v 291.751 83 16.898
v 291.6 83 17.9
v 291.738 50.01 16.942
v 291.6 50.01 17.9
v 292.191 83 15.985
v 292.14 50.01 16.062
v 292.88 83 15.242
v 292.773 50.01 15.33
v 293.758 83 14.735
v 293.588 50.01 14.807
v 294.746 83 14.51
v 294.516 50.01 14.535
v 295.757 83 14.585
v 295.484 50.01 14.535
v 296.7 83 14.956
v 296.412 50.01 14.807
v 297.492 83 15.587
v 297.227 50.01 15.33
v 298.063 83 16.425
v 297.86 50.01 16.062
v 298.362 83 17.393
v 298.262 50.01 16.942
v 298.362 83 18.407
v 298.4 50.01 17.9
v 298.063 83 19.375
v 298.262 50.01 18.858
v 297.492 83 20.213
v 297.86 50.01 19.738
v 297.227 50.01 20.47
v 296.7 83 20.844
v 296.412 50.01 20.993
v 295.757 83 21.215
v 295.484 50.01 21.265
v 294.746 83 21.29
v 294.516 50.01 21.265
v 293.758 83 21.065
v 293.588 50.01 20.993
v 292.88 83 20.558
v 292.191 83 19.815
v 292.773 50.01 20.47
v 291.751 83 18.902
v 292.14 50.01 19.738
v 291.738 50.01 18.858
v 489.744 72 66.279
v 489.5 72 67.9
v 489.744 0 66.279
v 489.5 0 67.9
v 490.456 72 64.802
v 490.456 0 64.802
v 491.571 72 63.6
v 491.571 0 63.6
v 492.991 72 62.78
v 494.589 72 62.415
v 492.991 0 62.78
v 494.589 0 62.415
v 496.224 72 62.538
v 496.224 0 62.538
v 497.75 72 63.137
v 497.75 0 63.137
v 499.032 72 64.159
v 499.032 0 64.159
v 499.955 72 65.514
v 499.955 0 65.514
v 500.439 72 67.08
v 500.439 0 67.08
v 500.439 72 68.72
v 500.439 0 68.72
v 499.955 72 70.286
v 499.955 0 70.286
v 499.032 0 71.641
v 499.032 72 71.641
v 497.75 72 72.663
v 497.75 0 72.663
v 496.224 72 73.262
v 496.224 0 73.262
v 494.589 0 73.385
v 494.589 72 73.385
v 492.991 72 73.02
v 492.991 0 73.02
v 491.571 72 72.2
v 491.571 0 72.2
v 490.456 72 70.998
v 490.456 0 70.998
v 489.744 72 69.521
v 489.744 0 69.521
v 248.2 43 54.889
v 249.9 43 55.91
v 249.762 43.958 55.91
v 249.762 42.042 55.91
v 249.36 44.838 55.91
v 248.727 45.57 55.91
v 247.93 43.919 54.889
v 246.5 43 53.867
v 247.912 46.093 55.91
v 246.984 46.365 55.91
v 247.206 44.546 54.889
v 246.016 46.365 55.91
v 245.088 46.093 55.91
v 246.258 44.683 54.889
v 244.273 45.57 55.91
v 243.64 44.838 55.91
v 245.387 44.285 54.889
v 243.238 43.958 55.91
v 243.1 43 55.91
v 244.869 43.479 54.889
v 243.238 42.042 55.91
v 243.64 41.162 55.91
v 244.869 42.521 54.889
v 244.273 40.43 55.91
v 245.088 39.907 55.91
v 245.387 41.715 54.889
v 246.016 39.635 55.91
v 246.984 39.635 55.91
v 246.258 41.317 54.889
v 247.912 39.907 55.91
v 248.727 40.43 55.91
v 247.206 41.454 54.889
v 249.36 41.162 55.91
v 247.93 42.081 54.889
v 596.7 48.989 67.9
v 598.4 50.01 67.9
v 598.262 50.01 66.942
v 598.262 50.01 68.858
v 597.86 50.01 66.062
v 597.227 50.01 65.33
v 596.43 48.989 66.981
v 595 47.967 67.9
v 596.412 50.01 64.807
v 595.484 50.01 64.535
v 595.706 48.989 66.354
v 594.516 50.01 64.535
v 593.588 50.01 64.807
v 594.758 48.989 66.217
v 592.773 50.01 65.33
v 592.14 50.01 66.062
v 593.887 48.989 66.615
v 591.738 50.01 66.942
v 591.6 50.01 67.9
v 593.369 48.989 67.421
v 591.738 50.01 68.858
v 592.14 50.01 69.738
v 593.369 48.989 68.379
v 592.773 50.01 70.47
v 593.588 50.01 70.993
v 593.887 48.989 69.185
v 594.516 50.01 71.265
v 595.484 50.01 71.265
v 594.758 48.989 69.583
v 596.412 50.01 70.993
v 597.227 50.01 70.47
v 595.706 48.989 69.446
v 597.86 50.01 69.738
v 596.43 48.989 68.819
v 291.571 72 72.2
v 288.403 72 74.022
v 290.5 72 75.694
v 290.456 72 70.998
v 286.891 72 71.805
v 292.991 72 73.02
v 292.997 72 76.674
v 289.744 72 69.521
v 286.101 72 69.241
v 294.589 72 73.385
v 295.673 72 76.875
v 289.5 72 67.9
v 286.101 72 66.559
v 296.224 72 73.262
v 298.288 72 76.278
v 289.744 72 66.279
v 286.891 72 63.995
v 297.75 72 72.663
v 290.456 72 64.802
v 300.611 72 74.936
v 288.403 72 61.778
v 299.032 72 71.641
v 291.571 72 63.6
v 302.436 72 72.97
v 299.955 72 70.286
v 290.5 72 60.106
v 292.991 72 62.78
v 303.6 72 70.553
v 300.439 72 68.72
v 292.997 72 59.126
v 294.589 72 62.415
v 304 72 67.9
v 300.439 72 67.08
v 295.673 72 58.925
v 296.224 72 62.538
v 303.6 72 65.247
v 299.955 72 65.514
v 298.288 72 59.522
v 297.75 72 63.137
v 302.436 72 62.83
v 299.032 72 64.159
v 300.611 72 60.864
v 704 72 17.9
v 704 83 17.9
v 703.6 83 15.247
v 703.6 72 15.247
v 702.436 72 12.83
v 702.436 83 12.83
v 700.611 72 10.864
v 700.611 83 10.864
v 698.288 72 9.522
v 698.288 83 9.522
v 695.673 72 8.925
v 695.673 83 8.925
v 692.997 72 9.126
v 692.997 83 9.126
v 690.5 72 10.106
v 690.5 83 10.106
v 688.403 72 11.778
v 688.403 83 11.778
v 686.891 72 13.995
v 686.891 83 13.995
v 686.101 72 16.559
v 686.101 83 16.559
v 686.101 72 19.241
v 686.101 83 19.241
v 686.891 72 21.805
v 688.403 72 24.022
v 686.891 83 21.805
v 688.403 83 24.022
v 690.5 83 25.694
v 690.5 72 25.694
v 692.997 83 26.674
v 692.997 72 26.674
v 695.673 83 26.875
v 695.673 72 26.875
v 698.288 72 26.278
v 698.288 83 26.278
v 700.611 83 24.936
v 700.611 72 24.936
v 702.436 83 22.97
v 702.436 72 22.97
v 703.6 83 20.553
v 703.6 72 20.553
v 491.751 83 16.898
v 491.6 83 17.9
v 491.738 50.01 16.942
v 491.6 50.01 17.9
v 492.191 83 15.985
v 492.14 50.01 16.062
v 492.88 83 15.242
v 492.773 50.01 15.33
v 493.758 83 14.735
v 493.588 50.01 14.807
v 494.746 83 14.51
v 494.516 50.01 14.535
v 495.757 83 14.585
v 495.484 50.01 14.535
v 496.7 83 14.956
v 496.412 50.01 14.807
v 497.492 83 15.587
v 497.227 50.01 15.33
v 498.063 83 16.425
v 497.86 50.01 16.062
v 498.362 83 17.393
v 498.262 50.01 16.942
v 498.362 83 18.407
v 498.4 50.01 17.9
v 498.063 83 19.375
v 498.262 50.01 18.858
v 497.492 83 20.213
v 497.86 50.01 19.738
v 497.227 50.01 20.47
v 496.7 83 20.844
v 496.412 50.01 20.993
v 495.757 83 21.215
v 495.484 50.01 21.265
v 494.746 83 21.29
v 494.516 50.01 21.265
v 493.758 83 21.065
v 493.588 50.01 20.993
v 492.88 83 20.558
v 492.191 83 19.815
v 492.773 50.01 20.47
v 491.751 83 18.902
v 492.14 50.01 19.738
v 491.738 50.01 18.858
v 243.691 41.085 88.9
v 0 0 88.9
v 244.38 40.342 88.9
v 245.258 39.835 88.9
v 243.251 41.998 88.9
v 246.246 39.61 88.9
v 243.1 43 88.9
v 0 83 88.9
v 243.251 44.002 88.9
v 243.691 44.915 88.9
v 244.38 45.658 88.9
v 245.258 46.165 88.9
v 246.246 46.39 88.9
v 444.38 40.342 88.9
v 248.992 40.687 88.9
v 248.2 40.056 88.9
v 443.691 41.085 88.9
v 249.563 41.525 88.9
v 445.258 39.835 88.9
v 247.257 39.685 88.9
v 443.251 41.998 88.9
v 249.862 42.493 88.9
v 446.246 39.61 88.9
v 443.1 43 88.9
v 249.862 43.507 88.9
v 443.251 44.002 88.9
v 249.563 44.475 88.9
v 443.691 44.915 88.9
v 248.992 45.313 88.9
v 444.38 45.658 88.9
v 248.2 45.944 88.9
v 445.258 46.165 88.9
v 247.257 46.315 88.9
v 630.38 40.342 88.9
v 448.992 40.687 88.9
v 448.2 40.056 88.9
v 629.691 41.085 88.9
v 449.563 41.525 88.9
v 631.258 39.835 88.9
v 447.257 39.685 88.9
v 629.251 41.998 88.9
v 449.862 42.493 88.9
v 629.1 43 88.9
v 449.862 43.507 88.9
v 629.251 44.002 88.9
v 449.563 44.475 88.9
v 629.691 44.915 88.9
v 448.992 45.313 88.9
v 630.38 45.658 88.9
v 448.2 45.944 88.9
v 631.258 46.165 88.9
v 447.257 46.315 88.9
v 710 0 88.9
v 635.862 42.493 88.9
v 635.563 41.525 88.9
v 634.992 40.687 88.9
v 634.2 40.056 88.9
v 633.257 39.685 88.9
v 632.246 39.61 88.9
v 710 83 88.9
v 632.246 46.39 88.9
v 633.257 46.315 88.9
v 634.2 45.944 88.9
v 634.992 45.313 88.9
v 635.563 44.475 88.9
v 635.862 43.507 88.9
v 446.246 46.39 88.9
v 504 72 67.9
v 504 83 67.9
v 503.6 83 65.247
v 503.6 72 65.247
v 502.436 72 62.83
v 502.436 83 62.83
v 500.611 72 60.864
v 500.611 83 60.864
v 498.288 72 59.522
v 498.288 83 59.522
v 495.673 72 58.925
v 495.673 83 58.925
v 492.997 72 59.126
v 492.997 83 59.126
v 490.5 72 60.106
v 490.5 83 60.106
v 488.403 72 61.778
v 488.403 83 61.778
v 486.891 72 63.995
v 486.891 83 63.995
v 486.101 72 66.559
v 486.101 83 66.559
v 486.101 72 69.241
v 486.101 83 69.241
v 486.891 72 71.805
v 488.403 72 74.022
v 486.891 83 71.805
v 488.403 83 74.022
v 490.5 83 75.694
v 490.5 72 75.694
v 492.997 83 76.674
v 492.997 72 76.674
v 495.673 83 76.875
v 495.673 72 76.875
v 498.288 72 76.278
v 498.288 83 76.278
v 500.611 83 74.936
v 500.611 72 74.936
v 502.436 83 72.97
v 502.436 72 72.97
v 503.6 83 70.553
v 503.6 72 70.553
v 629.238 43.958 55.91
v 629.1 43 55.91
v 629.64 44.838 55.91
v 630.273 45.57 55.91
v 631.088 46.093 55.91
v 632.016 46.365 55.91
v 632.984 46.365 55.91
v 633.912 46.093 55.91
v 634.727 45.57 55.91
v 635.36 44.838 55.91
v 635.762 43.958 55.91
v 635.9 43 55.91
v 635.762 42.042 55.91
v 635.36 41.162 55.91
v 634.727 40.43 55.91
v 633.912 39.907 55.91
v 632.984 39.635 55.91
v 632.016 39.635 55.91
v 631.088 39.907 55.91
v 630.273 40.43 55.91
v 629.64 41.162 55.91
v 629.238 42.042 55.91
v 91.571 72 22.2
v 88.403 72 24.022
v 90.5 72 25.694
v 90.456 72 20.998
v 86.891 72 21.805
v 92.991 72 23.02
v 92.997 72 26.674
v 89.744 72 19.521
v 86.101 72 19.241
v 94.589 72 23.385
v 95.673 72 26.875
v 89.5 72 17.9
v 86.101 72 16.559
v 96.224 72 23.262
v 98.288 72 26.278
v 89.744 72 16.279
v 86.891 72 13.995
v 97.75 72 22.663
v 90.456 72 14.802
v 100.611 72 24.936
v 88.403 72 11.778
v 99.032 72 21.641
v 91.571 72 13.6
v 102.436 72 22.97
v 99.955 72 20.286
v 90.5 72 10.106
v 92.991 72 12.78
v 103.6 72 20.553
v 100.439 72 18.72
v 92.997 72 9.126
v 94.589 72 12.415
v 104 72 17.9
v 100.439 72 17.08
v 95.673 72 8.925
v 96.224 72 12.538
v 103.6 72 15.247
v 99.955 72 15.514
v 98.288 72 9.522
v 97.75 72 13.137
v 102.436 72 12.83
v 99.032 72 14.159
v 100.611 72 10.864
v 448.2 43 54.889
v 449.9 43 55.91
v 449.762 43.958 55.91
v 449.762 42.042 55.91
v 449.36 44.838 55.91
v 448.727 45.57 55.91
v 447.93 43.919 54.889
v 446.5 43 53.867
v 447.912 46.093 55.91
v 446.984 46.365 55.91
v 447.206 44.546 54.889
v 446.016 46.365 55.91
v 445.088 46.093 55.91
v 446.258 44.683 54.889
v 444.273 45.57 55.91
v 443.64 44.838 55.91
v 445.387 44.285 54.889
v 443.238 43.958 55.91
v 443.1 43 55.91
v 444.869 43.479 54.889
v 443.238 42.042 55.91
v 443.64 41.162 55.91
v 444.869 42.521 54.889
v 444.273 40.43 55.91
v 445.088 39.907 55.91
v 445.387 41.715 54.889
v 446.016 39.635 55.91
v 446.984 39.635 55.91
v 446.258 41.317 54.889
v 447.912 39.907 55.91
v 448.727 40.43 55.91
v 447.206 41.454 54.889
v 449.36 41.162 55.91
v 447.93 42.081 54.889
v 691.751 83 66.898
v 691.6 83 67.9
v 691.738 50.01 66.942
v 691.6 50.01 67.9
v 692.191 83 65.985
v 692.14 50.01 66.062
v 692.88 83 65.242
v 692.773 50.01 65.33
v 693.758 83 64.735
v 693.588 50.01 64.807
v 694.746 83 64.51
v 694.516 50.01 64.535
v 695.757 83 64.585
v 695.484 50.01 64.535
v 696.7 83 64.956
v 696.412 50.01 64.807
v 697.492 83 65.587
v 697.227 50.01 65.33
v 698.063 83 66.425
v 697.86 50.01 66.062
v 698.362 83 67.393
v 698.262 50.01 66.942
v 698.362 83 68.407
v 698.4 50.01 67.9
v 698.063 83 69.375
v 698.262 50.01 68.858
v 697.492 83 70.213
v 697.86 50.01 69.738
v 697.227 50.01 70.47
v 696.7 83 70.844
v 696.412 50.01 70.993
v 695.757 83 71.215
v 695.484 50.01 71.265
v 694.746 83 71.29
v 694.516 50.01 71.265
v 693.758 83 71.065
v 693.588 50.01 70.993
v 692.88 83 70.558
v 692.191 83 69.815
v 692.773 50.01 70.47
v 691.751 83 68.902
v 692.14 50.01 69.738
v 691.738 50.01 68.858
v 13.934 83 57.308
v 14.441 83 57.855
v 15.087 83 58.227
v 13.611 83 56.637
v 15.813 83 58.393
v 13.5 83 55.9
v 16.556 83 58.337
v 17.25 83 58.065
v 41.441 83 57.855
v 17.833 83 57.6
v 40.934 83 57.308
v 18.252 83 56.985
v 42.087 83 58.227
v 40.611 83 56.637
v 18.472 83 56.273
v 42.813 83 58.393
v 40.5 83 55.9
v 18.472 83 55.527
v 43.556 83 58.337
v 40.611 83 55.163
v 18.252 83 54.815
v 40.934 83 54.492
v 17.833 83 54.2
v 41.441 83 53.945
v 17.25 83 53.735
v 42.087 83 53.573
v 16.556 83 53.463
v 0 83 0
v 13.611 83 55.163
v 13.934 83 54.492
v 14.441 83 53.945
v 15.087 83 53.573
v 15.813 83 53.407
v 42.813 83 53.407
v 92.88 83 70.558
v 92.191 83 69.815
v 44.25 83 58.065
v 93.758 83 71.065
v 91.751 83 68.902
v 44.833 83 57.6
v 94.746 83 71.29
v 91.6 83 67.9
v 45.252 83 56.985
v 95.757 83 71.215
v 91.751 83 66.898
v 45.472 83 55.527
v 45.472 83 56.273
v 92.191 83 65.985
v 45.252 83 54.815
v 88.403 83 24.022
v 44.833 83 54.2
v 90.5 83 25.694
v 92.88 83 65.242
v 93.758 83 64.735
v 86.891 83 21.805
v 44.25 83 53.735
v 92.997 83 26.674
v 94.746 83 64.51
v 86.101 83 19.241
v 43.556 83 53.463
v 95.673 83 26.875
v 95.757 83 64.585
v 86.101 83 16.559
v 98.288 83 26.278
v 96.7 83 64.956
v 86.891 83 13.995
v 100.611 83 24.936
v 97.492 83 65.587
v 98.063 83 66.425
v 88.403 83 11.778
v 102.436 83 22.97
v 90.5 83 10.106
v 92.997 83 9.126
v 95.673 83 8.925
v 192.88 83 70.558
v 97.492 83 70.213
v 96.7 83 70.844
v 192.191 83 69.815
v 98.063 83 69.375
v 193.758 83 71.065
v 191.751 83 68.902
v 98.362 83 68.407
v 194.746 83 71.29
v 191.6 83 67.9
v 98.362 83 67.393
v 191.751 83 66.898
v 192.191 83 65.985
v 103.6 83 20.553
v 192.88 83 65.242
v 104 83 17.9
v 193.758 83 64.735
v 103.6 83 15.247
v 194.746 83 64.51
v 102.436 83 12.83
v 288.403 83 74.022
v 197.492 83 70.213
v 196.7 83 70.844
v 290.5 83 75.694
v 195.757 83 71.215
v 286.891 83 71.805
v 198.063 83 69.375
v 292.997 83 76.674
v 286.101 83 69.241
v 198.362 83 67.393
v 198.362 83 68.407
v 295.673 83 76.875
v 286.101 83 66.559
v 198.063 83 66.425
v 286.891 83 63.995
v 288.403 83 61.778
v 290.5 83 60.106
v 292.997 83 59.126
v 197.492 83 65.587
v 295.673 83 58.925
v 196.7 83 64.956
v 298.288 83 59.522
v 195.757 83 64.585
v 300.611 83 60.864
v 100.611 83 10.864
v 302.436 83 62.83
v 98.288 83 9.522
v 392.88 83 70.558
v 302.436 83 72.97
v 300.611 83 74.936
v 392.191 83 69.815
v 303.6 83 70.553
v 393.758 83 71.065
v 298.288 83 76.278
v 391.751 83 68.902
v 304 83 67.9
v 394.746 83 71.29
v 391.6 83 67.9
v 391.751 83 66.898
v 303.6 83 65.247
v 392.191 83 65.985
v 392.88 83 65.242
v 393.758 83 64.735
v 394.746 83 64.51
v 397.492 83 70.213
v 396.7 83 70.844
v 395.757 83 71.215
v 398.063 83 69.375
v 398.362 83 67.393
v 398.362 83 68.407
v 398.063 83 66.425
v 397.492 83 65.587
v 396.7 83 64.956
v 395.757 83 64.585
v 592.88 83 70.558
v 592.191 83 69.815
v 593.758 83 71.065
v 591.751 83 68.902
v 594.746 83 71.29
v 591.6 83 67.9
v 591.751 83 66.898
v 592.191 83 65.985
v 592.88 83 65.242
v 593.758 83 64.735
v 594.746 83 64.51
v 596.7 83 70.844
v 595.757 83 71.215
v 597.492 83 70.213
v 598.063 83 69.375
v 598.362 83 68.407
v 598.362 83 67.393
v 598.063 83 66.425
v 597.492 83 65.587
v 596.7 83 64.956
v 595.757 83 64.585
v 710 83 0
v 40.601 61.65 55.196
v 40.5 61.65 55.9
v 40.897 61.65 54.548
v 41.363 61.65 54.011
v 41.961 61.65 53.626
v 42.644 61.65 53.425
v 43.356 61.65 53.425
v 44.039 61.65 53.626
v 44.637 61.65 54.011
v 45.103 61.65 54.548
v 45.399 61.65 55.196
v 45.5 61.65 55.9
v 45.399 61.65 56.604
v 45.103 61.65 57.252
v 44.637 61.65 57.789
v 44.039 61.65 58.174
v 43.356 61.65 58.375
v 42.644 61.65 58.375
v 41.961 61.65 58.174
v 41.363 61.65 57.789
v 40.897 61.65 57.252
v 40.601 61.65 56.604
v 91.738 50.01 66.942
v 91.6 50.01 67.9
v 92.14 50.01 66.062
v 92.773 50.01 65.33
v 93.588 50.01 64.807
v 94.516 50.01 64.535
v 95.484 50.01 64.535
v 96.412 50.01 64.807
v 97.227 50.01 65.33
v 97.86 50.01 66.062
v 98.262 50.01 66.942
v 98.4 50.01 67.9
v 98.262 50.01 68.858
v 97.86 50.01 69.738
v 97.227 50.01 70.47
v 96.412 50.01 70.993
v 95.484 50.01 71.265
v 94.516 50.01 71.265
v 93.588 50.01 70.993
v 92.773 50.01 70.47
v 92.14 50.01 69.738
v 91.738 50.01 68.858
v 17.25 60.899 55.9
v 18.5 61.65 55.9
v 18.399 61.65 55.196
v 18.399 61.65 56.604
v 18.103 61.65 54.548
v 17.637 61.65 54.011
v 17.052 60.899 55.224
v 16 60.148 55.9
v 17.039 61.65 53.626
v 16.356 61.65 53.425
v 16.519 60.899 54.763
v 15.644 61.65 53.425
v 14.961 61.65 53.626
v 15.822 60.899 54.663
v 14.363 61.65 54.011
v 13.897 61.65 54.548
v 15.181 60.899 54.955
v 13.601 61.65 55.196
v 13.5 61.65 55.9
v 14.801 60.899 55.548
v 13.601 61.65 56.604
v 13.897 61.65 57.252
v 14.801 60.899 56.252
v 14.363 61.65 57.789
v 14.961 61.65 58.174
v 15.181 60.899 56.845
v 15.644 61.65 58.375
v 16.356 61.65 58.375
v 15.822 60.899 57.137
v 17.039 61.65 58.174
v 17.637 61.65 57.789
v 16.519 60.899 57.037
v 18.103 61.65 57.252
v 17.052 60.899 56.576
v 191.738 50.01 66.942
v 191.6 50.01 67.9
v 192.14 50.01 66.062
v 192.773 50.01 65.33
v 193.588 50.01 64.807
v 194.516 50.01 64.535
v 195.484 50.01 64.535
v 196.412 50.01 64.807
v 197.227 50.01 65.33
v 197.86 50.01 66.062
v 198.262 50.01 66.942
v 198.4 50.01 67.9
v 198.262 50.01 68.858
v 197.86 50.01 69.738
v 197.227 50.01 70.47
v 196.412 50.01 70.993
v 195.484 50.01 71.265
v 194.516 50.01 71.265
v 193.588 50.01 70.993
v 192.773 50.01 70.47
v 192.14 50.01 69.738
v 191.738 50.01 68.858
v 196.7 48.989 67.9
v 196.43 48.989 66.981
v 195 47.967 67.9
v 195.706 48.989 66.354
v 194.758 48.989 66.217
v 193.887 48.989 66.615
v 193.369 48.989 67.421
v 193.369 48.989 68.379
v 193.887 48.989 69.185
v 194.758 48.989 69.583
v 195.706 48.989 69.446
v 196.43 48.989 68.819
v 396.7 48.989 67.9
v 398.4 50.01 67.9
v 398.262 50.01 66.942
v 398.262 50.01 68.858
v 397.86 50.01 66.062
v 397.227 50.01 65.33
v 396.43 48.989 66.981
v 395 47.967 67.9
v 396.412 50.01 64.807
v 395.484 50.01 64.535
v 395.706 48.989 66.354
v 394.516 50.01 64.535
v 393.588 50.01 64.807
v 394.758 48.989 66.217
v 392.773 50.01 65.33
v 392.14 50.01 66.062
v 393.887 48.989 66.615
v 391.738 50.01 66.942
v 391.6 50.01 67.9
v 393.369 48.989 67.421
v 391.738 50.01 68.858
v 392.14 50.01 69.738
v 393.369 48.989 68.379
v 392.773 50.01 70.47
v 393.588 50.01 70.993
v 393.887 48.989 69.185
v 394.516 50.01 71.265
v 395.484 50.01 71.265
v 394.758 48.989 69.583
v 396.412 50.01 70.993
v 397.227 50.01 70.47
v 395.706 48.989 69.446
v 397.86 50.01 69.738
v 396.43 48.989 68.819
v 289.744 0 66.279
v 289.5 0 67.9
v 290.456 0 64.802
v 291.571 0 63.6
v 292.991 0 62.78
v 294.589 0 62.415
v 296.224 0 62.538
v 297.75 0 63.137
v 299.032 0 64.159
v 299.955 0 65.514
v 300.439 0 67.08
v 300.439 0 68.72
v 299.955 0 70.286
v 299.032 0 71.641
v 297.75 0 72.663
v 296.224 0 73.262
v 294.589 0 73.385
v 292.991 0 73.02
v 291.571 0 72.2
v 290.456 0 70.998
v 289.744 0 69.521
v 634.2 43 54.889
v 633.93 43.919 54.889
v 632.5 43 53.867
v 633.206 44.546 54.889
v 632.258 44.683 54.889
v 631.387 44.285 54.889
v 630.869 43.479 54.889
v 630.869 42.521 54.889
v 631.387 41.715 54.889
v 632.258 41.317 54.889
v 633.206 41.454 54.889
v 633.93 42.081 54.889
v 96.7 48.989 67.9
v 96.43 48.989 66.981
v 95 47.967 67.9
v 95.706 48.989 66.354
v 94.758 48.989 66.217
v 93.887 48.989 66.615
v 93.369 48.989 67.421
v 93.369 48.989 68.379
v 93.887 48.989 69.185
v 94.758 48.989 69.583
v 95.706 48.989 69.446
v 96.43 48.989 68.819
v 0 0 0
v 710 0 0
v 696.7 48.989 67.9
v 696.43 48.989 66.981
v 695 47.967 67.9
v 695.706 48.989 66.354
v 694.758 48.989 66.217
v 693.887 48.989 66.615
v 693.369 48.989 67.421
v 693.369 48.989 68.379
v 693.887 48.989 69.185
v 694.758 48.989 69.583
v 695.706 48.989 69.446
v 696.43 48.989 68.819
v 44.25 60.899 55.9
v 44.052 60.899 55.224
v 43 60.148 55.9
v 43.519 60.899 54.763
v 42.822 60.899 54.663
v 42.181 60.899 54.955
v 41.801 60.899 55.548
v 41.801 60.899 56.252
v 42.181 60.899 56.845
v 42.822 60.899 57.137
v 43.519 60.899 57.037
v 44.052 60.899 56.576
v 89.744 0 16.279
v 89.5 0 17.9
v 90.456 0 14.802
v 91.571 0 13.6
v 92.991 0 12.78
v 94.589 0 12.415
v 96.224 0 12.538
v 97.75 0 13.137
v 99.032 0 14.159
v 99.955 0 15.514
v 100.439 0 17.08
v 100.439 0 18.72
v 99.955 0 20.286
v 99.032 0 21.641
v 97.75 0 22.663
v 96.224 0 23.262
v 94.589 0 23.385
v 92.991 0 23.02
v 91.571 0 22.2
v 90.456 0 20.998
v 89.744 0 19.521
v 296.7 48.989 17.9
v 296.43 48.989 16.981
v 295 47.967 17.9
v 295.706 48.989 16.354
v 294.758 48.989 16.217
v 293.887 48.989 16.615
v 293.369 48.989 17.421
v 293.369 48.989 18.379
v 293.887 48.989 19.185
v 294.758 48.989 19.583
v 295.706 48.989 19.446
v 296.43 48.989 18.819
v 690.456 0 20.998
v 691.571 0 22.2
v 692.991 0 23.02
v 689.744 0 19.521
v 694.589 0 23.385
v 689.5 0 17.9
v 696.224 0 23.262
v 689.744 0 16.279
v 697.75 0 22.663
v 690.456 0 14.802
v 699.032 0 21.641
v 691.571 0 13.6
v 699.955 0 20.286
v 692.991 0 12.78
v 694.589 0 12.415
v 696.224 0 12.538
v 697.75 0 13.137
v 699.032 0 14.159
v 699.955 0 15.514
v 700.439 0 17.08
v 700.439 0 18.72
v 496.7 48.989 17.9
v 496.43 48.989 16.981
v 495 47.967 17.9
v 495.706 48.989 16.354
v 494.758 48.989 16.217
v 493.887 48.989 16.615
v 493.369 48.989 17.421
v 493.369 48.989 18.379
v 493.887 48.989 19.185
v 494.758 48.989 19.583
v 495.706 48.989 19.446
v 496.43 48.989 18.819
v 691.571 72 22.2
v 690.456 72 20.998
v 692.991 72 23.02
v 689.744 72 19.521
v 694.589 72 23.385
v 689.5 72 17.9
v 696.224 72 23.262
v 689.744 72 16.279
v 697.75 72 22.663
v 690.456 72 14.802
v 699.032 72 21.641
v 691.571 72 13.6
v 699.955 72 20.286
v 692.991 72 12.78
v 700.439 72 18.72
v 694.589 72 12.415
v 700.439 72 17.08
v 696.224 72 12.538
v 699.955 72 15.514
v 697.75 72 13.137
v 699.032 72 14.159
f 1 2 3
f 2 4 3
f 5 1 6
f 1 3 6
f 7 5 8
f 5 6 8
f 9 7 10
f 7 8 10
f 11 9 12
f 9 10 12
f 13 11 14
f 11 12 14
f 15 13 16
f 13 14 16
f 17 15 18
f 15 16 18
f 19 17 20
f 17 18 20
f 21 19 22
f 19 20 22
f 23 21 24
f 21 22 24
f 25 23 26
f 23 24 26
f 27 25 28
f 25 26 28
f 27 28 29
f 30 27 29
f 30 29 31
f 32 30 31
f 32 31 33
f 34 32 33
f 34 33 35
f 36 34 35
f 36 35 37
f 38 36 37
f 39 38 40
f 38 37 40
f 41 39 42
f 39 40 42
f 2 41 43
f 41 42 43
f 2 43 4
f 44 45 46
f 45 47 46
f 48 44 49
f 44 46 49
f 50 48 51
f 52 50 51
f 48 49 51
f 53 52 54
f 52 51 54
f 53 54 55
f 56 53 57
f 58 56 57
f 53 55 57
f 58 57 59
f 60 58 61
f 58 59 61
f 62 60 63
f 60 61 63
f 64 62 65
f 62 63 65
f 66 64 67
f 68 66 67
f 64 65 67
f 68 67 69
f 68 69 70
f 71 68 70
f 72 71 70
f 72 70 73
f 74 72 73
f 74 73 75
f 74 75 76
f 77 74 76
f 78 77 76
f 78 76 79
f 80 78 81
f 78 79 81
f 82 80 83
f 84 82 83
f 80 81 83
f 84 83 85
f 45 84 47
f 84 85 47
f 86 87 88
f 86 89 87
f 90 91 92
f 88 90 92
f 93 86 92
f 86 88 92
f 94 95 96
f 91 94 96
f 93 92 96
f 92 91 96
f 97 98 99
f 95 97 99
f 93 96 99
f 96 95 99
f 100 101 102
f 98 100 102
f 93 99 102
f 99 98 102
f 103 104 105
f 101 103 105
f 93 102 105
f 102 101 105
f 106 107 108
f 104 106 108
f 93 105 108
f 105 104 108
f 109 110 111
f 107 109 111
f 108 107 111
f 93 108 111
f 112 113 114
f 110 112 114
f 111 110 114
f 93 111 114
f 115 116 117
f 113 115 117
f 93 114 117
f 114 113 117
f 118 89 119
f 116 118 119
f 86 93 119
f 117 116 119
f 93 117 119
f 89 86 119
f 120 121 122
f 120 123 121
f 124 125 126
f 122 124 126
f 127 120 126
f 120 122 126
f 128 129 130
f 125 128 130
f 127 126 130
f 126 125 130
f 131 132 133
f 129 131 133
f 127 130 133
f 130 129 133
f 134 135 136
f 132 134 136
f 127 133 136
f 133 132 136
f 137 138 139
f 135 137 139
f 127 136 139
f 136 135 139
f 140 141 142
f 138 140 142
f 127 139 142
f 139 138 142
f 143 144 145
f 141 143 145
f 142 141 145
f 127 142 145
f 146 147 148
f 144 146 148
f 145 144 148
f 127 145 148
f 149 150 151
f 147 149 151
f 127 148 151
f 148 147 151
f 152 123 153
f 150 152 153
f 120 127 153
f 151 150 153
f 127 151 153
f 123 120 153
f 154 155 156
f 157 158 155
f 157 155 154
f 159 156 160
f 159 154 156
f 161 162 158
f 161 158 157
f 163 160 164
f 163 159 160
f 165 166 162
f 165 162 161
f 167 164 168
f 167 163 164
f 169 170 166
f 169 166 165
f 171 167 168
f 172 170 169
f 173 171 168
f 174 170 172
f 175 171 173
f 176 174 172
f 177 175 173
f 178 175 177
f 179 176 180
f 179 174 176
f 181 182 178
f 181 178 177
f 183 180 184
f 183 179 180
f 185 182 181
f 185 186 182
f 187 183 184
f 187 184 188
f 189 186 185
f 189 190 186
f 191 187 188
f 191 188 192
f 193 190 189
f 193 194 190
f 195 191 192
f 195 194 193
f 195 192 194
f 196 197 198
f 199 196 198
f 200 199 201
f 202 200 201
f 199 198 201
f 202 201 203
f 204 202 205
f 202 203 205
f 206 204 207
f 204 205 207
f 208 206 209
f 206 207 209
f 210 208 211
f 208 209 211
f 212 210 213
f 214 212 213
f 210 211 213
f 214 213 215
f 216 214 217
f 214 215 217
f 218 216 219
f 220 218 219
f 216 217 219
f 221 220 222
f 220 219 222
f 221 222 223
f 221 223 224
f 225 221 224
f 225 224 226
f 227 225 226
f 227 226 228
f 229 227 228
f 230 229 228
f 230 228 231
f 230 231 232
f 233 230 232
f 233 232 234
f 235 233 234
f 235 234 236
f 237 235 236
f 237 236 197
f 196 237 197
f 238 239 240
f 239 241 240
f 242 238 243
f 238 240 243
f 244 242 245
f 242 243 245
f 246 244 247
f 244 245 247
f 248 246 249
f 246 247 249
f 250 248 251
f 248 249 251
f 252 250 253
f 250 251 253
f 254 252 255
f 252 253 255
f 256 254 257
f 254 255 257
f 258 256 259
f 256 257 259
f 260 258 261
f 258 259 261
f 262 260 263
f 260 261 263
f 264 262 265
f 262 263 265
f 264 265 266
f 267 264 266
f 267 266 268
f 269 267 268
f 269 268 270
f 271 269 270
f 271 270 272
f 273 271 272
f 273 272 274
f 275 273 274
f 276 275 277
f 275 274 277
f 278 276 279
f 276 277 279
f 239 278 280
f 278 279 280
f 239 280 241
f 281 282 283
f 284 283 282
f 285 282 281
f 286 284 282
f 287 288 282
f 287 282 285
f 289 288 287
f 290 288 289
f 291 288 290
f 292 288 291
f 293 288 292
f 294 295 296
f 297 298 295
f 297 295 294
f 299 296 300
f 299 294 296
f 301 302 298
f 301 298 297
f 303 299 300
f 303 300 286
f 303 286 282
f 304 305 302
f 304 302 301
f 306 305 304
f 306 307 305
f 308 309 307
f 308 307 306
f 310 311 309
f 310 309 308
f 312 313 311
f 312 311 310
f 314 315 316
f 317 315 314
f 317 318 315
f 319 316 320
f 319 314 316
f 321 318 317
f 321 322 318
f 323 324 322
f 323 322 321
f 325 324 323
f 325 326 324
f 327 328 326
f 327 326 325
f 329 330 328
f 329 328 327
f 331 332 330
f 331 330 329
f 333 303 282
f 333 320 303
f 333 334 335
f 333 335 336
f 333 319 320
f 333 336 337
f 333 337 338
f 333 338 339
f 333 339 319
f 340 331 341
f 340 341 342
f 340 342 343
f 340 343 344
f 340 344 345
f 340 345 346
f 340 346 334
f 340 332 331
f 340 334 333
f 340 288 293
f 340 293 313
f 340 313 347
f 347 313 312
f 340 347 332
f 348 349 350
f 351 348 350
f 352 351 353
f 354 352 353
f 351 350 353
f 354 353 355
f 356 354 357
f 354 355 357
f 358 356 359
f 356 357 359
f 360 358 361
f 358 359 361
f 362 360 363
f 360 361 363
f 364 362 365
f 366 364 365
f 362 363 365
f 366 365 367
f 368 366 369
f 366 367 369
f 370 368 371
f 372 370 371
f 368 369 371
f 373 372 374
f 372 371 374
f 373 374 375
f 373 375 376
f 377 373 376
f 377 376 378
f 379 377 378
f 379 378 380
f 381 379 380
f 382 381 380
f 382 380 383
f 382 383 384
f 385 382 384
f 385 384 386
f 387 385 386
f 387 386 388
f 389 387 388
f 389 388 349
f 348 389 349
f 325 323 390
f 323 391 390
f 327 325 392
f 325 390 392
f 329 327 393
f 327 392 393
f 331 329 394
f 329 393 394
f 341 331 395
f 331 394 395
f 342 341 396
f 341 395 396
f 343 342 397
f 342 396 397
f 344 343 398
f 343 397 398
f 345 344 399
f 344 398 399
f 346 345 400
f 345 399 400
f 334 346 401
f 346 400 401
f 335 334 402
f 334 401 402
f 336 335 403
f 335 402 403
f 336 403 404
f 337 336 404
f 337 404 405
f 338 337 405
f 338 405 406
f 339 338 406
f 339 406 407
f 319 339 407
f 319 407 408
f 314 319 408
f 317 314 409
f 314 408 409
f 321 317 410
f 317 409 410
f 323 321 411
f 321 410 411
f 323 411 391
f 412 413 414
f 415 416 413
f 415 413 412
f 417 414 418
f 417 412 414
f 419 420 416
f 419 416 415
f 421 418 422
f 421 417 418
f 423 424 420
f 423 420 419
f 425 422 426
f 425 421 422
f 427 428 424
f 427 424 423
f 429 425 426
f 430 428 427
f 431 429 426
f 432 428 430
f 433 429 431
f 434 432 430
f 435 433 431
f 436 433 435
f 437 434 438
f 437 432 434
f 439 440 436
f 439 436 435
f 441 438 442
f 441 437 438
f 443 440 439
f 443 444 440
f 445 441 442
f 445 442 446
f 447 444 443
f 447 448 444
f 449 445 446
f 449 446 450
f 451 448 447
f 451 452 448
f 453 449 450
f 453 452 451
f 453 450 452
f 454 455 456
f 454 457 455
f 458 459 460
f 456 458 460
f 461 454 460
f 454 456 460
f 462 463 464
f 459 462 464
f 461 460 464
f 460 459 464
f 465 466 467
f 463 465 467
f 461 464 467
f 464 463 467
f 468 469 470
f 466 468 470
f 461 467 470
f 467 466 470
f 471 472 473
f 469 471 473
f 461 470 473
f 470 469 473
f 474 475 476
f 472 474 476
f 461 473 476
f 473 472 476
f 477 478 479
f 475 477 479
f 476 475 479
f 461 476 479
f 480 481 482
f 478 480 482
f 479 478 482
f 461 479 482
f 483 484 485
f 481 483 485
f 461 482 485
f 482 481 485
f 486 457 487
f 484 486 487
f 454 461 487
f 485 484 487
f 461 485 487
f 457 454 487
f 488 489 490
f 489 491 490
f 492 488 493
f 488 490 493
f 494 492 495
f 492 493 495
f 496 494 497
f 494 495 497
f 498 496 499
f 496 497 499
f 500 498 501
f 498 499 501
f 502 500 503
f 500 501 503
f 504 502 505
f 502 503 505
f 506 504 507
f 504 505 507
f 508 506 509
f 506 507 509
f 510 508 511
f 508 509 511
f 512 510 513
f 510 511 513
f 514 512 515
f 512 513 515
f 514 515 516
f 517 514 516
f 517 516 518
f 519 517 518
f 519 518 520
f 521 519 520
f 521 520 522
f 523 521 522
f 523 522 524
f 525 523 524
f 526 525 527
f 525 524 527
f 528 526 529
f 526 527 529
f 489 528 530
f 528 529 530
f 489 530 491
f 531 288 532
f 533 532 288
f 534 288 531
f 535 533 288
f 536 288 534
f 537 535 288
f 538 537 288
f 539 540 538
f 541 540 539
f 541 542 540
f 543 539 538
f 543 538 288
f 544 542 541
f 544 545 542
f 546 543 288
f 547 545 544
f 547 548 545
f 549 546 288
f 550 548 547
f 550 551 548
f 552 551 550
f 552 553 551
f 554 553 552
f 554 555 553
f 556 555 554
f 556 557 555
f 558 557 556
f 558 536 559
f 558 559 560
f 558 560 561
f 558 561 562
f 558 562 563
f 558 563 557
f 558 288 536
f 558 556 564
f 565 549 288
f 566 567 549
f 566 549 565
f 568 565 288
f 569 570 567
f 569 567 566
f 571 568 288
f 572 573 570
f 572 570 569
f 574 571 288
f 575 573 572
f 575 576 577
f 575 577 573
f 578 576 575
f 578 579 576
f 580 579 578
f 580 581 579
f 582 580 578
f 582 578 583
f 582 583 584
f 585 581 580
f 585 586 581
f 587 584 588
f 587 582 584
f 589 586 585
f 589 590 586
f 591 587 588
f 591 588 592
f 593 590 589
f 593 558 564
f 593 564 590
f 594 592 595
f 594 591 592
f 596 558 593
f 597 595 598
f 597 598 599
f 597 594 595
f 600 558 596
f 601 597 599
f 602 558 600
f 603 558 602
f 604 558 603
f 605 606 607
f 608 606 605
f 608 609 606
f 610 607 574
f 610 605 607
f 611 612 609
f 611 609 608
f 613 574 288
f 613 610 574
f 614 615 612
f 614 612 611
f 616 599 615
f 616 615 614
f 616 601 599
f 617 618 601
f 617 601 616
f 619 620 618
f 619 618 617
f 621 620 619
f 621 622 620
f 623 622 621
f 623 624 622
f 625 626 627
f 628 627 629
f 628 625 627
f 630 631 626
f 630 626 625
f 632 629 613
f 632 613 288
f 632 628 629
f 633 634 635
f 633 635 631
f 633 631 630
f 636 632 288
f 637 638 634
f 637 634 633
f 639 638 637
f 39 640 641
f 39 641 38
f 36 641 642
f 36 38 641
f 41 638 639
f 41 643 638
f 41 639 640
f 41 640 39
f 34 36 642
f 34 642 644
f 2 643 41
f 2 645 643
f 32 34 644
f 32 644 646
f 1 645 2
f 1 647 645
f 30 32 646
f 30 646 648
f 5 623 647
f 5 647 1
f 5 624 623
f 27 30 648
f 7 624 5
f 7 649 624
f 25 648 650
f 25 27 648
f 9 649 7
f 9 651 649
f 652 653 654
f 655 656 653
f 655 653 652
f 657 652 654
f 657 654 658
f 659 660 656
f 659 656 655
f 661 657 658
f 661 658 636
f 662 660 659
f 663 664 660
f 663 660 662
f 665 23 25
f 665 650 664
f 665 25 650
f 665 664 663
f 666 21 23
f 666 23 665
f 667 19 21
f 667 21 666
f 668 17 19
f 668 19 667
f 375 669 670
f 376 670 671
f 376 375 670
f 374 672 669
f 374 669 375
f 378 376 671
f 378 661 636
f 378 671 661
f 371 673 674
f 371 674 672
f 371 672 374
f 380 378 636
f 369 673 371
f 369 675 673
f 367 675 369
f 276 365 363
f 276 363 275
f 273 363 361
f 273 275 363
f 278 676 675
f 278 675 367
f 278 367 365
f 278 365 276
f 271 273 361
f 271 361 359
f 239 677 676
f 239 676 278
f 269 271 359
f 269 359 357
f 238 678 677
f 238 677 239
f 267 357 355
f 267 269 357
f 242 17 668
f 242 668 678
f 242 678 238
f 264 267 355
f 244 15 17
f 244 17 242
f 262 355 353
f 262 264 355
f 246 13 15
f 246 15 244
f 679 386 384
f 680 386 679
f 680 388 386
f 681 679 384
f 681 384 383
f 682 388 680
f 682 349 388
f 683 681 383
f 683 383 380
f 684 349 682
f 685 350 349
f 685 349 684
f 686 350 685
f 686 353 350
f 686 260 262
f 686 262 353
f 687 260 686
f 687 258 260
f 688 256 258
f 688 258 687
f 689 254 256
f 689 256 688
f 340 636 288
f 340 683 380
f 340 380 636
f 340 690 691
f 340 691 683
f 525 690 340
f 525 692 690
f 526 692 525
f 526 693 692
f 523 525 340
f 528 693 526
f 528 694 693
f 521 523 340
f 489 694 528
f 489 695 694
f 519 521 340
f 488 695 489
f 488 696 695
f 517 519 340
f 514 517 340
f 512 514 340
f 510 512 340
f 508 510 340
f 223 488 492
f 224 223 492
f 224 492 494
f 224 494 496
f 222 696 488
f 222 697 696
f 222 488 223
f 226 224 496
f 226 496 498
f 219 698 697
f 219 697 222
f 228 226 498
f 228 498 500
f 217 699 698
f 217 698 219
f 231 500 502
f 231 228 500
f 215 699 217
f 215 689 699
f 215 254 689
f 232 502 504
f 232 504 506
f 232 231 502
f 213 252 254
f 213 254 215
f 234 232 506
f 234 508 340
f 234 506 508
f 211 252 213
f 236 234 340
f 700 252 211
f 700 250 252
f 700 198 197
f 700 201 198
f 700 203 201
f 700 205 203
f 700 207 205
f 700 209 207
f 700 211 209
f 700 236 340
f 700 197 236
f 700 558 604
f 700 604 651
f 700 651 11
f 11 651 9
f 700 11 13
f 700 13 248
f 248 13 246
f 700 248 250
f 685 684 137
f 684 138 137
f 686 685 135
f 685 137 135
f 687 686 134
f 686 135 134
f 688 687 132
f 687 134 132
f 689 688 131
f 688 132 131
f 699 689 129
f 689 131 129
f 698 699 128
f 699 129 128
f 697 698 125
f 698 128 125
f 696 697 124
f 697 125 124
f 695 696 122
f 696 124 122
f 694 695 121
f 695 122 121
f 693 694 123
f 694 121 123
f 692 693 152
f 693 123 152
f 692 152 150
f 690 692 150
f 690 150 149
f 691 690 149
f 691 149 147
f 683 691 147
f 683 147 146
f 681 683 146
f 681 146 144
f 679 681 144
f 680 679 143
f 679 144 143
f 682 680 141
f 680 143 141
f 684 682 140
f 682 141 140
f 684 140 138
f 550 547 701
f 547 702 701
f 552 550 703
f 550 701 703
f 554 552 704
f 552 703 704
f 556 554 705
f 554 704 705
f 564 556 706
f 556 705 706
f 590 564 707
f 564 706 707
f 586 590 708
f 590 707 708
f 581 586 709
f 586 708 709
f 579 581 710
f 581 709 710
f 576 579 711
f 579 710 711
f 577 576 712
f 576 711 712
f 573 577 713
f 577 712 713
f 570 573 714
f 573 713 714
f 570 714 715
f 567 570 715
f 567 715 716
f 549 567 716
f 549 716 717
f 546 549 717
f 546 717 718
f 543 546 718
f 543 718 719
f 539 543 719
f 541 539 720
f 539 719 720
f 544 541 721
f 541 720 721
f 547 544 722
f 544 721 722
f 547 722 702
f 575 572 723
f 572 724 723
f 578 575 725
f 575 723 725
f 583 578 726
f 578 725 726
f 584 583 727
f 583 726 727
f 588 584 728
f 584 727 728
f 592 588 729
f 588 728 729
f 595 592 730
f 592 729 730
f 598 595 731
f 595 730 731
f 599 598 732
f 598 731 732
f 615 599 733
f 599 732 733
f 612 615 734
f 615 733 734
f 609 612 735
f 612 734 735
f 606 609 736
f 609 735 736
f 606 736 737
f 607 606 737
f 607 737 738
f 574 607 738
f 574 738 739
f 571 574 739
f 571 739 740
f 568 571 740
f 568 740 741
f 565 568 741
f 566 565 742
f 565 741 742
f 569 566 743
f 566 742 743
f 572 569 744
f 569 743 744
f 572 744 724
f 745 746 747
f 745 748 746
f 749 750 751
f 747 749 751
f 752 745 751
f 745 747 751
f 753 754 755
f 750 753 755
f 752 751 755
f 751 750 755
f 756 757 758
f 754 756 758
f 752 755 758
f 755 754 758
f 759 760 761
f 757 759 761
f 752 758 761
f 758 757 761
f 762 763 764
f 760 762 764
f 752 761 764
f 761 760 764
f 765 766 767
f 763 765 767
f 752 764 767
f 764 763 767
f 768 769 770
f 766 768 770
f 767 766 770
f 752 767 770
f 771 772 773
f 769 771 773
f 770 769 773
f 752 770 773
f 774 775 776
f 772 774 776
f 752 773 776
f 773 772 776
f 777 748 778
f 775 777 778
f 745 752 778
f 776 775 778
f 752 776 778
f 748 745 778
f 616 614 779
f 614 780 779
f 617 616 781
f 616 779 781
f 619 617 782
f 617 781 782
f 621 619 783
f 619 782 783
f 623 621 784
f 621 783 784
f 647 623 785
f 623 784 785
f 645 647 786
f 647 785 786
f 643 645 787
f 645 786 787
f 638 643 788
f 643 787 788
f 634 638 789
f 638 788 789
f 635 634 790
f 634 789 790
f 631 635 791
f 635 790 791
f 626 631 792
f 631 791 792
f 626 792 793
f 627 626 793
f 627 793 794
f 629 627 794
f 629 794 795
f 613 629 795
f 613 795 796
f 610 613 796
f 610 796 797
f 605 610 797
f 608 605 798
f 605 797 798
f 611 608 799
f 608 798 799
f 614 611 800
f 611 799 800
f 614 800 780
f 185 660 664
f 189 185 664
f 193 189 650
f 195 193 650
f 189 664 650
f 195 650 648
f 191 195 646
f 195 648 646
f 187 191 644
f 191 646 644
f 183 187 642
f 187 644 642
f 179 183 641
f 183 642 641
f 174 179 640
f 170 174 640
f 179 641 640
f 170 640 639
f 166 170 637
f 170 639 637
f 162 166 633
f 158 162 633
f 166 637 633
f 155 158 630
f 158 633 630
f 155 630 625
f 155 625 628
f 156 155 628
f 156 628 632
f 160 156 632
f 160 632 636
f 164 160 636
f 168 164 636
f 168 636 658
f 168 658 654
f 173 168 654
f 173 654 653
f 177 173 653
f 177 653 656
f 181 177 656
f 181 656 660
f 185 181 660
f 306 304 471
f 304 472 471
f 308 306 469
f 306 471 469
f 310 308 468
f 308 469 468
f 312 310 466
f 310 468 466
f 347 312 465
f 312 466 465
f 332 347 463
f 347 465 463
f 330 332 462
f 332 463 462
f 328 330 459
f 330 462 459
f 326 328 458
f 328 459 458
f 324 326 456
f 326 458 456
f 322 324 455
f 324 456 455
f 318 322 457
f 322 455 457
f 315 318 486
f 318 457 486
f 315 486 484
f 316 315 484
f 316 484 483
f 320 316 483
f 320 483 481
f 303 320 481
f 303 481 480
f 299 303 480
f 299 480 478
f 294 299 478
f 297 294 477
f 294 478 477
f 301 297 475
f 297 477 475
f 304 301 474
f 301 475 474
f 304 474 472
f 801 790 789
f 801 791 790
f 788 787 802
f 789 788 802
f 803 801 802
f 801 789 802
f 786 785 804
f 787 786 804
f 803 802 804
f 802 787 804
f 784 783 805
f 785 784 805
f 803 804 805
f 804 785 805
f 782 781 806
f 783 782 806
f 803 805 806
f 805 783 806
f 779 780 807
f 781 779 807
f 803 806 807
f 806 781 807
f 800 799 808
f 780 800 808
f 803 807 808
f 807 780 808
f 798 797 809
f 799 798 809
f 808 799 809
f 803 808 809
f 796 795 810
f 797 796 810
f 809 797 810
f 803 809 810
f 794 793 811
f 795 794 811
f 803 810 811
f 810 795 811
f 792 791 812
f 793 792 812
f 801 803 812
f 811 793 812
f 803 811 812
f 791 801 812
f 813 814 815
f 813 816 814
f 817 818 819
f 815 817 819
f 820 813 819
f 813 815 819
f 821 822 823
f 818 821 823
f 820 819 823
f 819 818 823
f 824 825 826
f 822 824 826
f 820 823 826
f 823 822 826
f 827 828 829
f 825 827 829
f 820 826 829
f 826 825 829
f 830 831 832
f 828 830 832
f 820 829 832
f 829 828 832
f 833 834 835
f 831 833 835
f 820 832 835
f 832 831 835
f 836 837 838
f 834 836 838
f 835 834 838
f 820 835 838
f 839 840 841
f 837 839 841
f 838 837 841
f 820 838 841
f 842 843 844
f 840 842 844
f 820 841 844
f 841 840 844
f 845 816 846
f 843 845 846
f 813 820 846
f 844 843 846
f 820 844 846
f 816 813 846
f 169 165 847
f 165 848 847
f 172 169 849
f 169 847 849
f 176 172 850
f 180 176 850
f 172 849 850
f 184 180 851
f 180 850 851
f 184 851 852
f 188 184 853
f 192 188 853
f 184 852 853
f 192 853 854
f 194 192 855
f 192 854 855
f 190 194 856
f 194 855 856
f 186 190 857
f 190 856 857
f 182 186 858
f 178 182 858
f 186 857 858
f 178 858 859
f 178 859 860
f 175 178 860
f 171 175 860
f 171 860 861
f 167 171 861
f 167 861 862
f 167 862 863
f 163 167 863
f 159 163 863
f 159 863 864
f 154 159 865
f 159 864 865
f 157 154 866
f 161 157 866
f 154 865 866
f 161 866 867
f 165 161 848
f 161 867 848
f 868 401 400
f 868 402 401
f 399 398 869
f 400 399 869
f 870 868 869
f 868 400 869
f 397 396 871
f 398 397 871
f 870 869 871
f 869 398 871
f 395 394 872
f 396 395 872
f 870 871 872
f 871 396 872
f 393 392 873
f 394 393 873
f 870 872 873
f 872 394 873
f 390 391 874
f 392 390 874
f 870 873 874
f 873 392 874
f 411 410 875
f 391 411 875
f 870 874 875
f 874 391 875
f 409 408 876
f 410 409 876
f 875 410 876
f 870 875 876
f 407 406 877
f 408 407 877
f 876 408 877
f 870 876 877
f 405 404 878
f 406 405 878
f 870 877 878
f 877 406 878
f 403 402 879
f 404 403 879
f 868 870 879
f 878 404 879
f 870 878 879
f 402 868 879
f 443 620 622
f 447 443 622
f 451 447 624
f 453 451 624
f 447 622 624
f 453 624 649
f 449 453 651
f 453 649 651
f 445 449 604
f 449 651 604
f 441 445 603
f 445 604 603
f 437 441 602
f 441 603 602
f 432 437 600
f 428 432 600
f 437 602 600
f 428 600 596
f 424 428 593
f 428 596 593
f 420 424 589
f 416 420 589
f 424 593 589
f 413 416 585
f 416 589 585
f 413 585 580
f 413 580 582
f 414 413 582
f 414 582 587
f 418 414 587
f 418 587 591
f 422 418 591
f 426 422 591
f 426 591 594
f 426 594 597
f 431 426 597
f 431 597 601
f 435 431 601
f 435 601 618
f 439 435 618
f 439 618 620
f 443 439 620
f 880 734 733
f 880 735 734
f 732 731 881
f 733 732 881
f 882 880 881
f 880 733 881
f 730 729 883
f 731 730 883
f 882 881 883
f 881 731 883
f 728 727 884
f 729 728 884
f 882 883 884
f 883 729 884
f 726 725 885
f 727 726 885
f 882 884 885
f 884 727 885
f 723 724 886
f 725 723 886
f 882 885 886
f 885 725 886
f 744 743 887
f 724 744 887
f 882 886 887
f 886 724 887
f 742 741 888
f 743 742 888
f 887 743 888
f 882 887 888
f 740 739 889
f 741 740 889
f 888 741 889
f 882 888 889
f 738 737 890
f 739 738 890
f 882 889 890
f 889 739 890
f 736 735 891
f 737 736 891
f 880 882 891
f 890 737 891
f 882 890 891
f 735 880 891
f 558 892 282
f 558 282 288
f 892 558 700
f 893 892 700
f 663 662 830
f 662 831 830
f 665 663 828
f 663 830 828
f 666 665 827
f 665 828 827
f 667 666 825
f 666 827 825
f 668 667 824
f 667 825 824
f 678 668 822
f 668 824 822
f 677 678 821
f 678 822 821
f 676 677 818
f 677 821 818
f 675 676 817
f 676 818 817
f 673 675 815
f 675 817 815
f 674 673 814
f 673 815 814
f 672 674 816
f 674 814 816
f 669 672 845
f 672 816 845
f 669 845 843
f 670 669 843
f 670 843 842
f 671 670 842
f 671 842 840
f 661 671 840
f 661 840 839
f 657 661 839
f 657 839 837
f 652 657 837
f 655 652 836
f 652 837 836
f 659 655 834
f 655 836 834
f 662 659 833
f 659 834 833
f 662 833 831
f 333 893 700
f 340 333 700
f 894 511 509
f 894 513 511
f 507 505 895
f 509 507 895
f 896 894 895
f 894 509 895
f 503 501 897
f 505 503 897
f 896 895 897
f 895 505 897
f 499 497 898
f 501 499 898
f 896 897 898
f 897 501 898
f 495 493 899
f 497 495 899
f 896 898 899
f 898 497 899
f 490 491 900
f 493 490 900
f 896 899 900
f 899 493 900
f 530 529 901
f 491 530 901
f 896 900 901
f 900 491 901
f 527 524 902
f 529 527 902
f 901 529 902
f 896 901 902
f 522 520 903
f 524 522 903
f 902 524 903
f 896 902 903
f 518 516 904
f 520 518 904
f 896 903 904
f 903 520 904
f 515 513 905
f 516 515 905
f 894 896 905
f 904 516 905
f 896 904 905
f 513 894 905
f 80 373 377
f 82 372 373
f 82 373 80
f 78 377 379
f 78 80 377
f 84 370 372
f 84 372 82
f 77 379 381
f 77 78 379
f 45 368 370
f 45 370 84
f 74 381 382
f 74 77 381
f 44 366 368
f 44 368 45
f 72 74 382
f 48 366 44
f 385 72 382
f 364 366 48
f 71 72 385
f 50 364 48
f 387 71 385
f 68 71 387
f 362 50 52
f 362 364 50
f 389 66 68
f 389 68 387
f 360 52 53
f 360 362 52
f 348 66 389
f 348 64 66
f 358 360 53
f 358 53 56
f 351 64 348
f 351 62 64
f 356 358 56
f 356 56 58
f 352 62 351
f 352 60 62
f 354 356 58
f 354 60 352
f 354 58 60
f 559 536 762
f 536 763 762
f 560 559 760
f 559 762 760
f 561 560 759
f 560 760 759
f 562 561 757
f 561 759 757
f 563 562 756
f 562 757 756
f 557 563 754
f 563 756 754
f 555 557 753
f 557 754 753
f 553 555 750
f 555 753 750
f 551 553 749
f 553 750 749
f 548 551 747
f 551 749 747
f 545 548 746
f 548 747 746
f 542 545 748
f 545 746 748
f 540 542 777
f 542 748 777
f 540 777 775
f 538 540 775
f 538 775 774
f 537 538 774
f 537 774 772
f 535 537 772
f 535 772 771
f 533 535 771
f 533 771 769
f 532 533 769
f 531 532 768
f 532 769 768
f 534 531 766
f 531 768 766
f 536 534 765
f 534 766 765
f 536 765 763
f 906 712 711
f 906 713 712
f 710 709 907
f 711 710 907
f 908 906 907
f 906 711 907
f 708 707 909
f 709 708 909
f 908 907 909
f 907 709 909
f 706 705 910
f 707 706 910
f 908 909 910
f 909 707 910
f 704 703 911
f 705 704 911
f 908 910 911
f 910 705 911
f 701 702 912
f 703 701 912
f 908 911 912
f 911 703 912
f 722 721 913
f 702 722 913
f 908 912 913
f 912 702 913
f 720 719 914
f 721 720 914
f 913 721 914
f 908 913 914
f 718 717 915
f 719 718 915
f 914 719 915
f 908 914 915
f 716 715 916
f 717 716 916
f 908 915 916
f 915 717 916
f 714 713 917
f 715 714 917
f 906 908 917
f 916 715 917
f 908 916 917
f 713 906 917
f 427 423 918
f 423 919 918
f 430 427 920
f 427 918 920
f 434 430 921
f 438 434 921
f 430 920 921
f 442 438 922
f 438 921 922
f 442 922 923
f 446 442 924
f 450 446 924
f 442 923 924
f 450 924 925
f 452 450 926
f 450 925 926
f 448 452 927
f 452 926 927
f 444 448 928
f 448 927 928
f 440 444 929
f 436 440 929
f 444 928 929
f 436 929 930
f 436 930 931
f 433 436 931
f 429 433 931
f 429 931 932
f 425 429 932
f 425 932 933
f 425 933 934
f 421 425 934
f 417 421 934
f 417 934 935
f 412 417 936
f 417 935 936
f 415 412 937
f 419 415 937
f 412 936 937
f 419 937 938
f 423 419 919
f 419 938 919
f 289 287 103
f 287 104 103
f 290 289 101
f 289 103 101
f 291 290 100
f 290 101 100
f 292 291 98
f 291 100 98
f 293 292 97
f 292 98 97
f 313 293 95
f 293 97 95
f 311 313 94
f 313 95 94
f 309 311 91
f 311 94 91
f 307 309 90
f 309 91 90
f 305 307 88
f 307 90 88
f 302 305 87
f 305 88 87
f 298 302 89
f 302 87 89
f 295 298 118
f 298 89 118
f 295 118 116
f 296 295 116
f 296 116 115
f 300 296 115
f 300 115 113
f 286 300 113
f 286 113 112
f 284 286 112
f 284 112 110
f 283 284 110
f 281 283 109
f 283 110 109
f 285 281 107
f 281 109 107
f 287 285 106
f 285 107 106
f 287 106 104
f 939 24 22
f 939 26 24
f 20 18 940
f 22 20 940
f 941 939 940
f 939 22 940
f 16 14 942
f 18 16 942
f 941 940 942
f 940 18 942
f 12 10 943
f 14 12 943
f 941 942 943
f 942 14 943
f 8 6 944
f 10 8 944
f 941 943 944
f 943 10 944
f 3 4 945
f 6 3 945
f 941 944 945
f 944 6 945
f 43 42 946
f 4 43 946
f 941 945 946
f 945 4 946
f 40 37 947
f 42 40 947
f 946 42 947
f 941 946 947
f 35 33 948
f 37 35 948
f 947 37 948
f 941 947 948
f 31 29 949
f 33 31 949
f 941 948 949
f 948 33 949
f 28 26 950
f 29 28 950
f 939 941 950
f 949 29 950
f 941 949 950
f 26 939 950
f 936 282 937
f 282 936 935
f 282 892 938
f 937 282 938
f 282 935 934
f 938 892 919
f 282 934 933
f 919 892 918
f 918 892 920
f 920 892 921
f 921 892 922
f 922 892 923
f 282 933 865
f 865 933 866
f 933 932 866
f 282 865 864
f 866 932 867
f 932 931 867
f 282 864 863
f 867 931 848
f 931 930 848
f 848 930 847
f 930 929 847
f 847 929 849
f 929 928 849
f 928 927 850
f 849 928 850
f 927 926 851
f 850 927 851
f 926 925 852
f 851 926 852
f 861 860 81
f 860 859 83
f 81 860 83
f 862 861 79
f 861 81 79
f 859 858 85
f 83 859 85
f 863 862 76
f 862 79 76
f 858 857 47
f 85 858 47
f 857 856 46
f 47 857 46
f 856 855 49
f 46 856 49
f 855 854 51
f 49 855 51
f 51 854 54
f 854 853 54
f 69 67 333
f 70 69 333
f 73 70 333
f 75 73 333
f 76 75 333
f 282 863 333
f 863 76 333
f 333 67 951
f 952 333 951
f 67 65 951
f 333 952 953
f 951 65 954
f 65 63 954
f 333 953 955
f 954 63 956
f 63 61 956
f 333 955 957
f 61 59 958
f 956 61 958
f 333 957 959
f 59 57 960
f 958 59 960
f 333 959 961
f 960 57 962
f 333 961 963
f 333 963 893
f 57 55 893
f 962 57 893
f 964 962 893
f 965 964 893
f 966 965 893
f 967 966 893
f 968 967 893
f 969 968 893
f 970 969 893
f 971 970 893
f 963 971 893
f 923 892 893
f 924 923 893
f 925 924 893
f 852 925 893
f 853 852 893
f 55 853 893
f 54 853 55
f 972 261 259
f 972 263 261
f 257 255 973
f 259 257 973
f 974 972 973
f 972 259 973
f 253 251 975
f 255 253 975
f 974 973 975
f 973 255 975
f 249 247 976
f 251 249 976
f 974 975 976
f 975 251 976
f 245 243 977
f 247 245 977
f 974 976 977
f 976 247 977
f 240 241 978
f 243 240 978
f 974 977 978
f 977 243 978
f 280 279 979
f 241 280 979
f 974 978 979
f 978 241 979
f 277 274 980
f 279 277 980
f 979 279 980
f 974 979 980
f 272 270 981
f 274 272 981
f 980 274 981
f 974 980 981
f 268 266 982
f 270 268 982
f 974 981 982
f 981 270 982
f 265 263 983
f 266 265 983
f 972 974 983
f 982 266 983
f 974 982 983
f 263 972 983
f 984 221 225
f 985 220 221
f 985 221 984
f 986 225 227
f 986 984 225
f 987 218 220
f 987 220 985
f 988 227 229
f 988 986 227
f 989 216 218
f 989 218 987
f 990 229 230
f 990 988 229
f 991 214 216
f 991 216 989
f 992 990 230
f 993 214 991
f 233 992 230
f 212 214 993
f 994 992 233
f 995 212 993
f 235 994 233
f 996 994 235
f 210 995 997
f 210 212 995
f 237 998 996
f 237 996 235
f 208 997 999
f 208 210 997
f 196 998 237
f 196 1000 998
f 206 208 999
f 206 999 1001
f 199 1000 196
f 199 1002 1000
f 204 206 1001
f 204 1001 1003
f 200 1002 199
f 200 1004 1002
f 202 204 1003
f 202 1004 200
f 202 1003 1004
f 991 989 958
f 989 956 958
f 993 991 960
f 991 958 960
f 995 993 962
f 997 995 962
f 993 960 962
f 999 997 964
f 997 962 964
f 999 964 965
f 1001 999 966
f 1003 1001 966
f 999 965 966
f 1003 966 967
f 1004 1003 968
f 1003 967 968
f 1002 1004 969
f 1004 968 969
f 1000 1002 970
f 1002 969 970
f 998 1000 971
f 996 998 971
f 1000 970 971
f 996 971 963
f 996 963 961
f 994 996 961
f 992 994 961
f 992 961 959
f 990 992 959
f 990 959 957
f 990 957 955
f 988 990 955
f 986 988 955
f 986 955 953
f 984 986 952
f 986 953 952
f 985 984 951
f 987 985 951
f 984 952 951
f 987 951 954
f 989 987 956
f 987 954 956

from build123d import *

# Parameters (mm, degrees)
SKETCH1_W                                            = 710
SKETCH1_H                                            = 83
BOSS_EXTRUDE1_DEPTH                                  = 88.9
M8_TAPPED_HOLE1_D                                    = 6.8
M8_TAPPED_HOLE1_DEPTH                                = 32.99
M8_TAPPED_HOLE1_TIP                                  = 2.042926105
CBORE_FOR_M10_HEX_SOCKET_HEAD_CAP_SCREW1_D           = 11
CBORE_FOR_M10_HEX_SOCKET_HEAD_CAP_SCREW1_CBORE_D     = 18
CBORE_FOR_M10_HEX_SOCKET_HEAD_CAP_SCREW1_CBORE_DEPTH = 11
M6_TAPPED_HOLE1_D                                    = 5
M6_TAPPED_HOLE1_DEPTH                                = 21.35
M6_TAPPED_HOLE1_TIP                                  = 1.502151548
M8_TAPPED_HOLE2_D                                    = 6.8
M8_TAPPED_HOLE2_DEPTH                                = 32.99
M8_TAPPED_HOLE2_TIP                                  = 2.042926105


with BuildPart() as part:
    # Sketch1 → Boss-Extrude1 (new body)
    with BuildSketch(Plane.XY):
        with Locations((355, 41.5)):
            Rectangle(SKETCH1_W, SKETCH1_H)
    extrude(amount=BOSS_EXTRUDE1_DEPTH)

    # M8 Tapped Hole1
    with Locations(Plane(origin=(0, 83, 0), x_dir=(1, 0, 0), z_dir=(0, 1, 0))):
        with Locations((95, -67.9), (195, -67.9), (295, -17.9), (395, -67.9), (495, -17.9), (595, -67.9), (695, -67.9)):
            Hole(M8_TAPPED_HOLE1_D / 2, depth=M8_TAPPED_HOLE1_DEPTH)
            with Locations((0, 0, -(M8_TAPPED_HOLE1_DEPTH + M8_TAPPED_HOLE1_TIP / 2))):  # 118° drill point
                Cone(0, M8_TAPPED_HOLE1_D / 2, M8_TAPPED_HOLE1_TIP, mode=Mode.SUBTRACT)

    # CBORE for M10 Hex Socket Head Cap Screw1 (through all)
    with Locations(Plane(origin=(0, 83, 0), x_dir=(1, 0, 0), z_dir=(0, 1, 0))):
        with Locations((695, -17.9), (495, -67.9), (295, -67.9), (95, -17.9)):
            CounterBoreHole(CBORE_FOR_M10_HEX_SOCKET_HEAD_CAP_SCREW1_D / 2, CBORE_FOR_M10_HEX_SOCKET_HEAD_CAP_SCREW1_CBORE_D / 2, CBORE_FOR_M10_HEX_SOCKET_HEAD_CAP_SCREW1_CBORE_DEPTH)

    # M6 Tapped Hole1
    with Locations(Plane(origin=(0, 83, 0), x_dir=(1, 0, 0), z_dir=(0, 1, 0))):
        with Locations((16, -55.9), (43, -55.9)):
            Hole(M6_TAPPED_HOLE1_D / 2, depth=M6_TAPPED_HOLE1_DEPTH)
            with Locations((0, 0, -(M6_TAPPED_HOLE1_DEPTH + M6_TAPPED_HOLE1_TIP / 2))):  # 118° drill point
                Cone(0, M6_TAPPED_HOLE1_D / 2, M6_TAPPED_HOLE1_TIP, mode=Mode.SUBTRACT)

    # M8 Tapped Hole2
    with Locations(Plane.XY.offset(88.9)):
        with Locations((246.5, 43), (446.5, 43), (632.5, 43)):
            Hole(M8_TAPPED_HOLE2_D / 2, depth=M8_TAPPED_HOLE2_DEPTH)
            with Locations((0, 0, -(M8_TAPPED_HOLE2_DEPTH + M8_TAPPED_HOLE2_TIP / 2))):  # 118° drill point
                Cone(0, M8_TAPPED_HOLE2_D / 2, M8_TAPPED_HOLE2_TIP, mode=Mode.SUBTRACT)


solid = part.part
